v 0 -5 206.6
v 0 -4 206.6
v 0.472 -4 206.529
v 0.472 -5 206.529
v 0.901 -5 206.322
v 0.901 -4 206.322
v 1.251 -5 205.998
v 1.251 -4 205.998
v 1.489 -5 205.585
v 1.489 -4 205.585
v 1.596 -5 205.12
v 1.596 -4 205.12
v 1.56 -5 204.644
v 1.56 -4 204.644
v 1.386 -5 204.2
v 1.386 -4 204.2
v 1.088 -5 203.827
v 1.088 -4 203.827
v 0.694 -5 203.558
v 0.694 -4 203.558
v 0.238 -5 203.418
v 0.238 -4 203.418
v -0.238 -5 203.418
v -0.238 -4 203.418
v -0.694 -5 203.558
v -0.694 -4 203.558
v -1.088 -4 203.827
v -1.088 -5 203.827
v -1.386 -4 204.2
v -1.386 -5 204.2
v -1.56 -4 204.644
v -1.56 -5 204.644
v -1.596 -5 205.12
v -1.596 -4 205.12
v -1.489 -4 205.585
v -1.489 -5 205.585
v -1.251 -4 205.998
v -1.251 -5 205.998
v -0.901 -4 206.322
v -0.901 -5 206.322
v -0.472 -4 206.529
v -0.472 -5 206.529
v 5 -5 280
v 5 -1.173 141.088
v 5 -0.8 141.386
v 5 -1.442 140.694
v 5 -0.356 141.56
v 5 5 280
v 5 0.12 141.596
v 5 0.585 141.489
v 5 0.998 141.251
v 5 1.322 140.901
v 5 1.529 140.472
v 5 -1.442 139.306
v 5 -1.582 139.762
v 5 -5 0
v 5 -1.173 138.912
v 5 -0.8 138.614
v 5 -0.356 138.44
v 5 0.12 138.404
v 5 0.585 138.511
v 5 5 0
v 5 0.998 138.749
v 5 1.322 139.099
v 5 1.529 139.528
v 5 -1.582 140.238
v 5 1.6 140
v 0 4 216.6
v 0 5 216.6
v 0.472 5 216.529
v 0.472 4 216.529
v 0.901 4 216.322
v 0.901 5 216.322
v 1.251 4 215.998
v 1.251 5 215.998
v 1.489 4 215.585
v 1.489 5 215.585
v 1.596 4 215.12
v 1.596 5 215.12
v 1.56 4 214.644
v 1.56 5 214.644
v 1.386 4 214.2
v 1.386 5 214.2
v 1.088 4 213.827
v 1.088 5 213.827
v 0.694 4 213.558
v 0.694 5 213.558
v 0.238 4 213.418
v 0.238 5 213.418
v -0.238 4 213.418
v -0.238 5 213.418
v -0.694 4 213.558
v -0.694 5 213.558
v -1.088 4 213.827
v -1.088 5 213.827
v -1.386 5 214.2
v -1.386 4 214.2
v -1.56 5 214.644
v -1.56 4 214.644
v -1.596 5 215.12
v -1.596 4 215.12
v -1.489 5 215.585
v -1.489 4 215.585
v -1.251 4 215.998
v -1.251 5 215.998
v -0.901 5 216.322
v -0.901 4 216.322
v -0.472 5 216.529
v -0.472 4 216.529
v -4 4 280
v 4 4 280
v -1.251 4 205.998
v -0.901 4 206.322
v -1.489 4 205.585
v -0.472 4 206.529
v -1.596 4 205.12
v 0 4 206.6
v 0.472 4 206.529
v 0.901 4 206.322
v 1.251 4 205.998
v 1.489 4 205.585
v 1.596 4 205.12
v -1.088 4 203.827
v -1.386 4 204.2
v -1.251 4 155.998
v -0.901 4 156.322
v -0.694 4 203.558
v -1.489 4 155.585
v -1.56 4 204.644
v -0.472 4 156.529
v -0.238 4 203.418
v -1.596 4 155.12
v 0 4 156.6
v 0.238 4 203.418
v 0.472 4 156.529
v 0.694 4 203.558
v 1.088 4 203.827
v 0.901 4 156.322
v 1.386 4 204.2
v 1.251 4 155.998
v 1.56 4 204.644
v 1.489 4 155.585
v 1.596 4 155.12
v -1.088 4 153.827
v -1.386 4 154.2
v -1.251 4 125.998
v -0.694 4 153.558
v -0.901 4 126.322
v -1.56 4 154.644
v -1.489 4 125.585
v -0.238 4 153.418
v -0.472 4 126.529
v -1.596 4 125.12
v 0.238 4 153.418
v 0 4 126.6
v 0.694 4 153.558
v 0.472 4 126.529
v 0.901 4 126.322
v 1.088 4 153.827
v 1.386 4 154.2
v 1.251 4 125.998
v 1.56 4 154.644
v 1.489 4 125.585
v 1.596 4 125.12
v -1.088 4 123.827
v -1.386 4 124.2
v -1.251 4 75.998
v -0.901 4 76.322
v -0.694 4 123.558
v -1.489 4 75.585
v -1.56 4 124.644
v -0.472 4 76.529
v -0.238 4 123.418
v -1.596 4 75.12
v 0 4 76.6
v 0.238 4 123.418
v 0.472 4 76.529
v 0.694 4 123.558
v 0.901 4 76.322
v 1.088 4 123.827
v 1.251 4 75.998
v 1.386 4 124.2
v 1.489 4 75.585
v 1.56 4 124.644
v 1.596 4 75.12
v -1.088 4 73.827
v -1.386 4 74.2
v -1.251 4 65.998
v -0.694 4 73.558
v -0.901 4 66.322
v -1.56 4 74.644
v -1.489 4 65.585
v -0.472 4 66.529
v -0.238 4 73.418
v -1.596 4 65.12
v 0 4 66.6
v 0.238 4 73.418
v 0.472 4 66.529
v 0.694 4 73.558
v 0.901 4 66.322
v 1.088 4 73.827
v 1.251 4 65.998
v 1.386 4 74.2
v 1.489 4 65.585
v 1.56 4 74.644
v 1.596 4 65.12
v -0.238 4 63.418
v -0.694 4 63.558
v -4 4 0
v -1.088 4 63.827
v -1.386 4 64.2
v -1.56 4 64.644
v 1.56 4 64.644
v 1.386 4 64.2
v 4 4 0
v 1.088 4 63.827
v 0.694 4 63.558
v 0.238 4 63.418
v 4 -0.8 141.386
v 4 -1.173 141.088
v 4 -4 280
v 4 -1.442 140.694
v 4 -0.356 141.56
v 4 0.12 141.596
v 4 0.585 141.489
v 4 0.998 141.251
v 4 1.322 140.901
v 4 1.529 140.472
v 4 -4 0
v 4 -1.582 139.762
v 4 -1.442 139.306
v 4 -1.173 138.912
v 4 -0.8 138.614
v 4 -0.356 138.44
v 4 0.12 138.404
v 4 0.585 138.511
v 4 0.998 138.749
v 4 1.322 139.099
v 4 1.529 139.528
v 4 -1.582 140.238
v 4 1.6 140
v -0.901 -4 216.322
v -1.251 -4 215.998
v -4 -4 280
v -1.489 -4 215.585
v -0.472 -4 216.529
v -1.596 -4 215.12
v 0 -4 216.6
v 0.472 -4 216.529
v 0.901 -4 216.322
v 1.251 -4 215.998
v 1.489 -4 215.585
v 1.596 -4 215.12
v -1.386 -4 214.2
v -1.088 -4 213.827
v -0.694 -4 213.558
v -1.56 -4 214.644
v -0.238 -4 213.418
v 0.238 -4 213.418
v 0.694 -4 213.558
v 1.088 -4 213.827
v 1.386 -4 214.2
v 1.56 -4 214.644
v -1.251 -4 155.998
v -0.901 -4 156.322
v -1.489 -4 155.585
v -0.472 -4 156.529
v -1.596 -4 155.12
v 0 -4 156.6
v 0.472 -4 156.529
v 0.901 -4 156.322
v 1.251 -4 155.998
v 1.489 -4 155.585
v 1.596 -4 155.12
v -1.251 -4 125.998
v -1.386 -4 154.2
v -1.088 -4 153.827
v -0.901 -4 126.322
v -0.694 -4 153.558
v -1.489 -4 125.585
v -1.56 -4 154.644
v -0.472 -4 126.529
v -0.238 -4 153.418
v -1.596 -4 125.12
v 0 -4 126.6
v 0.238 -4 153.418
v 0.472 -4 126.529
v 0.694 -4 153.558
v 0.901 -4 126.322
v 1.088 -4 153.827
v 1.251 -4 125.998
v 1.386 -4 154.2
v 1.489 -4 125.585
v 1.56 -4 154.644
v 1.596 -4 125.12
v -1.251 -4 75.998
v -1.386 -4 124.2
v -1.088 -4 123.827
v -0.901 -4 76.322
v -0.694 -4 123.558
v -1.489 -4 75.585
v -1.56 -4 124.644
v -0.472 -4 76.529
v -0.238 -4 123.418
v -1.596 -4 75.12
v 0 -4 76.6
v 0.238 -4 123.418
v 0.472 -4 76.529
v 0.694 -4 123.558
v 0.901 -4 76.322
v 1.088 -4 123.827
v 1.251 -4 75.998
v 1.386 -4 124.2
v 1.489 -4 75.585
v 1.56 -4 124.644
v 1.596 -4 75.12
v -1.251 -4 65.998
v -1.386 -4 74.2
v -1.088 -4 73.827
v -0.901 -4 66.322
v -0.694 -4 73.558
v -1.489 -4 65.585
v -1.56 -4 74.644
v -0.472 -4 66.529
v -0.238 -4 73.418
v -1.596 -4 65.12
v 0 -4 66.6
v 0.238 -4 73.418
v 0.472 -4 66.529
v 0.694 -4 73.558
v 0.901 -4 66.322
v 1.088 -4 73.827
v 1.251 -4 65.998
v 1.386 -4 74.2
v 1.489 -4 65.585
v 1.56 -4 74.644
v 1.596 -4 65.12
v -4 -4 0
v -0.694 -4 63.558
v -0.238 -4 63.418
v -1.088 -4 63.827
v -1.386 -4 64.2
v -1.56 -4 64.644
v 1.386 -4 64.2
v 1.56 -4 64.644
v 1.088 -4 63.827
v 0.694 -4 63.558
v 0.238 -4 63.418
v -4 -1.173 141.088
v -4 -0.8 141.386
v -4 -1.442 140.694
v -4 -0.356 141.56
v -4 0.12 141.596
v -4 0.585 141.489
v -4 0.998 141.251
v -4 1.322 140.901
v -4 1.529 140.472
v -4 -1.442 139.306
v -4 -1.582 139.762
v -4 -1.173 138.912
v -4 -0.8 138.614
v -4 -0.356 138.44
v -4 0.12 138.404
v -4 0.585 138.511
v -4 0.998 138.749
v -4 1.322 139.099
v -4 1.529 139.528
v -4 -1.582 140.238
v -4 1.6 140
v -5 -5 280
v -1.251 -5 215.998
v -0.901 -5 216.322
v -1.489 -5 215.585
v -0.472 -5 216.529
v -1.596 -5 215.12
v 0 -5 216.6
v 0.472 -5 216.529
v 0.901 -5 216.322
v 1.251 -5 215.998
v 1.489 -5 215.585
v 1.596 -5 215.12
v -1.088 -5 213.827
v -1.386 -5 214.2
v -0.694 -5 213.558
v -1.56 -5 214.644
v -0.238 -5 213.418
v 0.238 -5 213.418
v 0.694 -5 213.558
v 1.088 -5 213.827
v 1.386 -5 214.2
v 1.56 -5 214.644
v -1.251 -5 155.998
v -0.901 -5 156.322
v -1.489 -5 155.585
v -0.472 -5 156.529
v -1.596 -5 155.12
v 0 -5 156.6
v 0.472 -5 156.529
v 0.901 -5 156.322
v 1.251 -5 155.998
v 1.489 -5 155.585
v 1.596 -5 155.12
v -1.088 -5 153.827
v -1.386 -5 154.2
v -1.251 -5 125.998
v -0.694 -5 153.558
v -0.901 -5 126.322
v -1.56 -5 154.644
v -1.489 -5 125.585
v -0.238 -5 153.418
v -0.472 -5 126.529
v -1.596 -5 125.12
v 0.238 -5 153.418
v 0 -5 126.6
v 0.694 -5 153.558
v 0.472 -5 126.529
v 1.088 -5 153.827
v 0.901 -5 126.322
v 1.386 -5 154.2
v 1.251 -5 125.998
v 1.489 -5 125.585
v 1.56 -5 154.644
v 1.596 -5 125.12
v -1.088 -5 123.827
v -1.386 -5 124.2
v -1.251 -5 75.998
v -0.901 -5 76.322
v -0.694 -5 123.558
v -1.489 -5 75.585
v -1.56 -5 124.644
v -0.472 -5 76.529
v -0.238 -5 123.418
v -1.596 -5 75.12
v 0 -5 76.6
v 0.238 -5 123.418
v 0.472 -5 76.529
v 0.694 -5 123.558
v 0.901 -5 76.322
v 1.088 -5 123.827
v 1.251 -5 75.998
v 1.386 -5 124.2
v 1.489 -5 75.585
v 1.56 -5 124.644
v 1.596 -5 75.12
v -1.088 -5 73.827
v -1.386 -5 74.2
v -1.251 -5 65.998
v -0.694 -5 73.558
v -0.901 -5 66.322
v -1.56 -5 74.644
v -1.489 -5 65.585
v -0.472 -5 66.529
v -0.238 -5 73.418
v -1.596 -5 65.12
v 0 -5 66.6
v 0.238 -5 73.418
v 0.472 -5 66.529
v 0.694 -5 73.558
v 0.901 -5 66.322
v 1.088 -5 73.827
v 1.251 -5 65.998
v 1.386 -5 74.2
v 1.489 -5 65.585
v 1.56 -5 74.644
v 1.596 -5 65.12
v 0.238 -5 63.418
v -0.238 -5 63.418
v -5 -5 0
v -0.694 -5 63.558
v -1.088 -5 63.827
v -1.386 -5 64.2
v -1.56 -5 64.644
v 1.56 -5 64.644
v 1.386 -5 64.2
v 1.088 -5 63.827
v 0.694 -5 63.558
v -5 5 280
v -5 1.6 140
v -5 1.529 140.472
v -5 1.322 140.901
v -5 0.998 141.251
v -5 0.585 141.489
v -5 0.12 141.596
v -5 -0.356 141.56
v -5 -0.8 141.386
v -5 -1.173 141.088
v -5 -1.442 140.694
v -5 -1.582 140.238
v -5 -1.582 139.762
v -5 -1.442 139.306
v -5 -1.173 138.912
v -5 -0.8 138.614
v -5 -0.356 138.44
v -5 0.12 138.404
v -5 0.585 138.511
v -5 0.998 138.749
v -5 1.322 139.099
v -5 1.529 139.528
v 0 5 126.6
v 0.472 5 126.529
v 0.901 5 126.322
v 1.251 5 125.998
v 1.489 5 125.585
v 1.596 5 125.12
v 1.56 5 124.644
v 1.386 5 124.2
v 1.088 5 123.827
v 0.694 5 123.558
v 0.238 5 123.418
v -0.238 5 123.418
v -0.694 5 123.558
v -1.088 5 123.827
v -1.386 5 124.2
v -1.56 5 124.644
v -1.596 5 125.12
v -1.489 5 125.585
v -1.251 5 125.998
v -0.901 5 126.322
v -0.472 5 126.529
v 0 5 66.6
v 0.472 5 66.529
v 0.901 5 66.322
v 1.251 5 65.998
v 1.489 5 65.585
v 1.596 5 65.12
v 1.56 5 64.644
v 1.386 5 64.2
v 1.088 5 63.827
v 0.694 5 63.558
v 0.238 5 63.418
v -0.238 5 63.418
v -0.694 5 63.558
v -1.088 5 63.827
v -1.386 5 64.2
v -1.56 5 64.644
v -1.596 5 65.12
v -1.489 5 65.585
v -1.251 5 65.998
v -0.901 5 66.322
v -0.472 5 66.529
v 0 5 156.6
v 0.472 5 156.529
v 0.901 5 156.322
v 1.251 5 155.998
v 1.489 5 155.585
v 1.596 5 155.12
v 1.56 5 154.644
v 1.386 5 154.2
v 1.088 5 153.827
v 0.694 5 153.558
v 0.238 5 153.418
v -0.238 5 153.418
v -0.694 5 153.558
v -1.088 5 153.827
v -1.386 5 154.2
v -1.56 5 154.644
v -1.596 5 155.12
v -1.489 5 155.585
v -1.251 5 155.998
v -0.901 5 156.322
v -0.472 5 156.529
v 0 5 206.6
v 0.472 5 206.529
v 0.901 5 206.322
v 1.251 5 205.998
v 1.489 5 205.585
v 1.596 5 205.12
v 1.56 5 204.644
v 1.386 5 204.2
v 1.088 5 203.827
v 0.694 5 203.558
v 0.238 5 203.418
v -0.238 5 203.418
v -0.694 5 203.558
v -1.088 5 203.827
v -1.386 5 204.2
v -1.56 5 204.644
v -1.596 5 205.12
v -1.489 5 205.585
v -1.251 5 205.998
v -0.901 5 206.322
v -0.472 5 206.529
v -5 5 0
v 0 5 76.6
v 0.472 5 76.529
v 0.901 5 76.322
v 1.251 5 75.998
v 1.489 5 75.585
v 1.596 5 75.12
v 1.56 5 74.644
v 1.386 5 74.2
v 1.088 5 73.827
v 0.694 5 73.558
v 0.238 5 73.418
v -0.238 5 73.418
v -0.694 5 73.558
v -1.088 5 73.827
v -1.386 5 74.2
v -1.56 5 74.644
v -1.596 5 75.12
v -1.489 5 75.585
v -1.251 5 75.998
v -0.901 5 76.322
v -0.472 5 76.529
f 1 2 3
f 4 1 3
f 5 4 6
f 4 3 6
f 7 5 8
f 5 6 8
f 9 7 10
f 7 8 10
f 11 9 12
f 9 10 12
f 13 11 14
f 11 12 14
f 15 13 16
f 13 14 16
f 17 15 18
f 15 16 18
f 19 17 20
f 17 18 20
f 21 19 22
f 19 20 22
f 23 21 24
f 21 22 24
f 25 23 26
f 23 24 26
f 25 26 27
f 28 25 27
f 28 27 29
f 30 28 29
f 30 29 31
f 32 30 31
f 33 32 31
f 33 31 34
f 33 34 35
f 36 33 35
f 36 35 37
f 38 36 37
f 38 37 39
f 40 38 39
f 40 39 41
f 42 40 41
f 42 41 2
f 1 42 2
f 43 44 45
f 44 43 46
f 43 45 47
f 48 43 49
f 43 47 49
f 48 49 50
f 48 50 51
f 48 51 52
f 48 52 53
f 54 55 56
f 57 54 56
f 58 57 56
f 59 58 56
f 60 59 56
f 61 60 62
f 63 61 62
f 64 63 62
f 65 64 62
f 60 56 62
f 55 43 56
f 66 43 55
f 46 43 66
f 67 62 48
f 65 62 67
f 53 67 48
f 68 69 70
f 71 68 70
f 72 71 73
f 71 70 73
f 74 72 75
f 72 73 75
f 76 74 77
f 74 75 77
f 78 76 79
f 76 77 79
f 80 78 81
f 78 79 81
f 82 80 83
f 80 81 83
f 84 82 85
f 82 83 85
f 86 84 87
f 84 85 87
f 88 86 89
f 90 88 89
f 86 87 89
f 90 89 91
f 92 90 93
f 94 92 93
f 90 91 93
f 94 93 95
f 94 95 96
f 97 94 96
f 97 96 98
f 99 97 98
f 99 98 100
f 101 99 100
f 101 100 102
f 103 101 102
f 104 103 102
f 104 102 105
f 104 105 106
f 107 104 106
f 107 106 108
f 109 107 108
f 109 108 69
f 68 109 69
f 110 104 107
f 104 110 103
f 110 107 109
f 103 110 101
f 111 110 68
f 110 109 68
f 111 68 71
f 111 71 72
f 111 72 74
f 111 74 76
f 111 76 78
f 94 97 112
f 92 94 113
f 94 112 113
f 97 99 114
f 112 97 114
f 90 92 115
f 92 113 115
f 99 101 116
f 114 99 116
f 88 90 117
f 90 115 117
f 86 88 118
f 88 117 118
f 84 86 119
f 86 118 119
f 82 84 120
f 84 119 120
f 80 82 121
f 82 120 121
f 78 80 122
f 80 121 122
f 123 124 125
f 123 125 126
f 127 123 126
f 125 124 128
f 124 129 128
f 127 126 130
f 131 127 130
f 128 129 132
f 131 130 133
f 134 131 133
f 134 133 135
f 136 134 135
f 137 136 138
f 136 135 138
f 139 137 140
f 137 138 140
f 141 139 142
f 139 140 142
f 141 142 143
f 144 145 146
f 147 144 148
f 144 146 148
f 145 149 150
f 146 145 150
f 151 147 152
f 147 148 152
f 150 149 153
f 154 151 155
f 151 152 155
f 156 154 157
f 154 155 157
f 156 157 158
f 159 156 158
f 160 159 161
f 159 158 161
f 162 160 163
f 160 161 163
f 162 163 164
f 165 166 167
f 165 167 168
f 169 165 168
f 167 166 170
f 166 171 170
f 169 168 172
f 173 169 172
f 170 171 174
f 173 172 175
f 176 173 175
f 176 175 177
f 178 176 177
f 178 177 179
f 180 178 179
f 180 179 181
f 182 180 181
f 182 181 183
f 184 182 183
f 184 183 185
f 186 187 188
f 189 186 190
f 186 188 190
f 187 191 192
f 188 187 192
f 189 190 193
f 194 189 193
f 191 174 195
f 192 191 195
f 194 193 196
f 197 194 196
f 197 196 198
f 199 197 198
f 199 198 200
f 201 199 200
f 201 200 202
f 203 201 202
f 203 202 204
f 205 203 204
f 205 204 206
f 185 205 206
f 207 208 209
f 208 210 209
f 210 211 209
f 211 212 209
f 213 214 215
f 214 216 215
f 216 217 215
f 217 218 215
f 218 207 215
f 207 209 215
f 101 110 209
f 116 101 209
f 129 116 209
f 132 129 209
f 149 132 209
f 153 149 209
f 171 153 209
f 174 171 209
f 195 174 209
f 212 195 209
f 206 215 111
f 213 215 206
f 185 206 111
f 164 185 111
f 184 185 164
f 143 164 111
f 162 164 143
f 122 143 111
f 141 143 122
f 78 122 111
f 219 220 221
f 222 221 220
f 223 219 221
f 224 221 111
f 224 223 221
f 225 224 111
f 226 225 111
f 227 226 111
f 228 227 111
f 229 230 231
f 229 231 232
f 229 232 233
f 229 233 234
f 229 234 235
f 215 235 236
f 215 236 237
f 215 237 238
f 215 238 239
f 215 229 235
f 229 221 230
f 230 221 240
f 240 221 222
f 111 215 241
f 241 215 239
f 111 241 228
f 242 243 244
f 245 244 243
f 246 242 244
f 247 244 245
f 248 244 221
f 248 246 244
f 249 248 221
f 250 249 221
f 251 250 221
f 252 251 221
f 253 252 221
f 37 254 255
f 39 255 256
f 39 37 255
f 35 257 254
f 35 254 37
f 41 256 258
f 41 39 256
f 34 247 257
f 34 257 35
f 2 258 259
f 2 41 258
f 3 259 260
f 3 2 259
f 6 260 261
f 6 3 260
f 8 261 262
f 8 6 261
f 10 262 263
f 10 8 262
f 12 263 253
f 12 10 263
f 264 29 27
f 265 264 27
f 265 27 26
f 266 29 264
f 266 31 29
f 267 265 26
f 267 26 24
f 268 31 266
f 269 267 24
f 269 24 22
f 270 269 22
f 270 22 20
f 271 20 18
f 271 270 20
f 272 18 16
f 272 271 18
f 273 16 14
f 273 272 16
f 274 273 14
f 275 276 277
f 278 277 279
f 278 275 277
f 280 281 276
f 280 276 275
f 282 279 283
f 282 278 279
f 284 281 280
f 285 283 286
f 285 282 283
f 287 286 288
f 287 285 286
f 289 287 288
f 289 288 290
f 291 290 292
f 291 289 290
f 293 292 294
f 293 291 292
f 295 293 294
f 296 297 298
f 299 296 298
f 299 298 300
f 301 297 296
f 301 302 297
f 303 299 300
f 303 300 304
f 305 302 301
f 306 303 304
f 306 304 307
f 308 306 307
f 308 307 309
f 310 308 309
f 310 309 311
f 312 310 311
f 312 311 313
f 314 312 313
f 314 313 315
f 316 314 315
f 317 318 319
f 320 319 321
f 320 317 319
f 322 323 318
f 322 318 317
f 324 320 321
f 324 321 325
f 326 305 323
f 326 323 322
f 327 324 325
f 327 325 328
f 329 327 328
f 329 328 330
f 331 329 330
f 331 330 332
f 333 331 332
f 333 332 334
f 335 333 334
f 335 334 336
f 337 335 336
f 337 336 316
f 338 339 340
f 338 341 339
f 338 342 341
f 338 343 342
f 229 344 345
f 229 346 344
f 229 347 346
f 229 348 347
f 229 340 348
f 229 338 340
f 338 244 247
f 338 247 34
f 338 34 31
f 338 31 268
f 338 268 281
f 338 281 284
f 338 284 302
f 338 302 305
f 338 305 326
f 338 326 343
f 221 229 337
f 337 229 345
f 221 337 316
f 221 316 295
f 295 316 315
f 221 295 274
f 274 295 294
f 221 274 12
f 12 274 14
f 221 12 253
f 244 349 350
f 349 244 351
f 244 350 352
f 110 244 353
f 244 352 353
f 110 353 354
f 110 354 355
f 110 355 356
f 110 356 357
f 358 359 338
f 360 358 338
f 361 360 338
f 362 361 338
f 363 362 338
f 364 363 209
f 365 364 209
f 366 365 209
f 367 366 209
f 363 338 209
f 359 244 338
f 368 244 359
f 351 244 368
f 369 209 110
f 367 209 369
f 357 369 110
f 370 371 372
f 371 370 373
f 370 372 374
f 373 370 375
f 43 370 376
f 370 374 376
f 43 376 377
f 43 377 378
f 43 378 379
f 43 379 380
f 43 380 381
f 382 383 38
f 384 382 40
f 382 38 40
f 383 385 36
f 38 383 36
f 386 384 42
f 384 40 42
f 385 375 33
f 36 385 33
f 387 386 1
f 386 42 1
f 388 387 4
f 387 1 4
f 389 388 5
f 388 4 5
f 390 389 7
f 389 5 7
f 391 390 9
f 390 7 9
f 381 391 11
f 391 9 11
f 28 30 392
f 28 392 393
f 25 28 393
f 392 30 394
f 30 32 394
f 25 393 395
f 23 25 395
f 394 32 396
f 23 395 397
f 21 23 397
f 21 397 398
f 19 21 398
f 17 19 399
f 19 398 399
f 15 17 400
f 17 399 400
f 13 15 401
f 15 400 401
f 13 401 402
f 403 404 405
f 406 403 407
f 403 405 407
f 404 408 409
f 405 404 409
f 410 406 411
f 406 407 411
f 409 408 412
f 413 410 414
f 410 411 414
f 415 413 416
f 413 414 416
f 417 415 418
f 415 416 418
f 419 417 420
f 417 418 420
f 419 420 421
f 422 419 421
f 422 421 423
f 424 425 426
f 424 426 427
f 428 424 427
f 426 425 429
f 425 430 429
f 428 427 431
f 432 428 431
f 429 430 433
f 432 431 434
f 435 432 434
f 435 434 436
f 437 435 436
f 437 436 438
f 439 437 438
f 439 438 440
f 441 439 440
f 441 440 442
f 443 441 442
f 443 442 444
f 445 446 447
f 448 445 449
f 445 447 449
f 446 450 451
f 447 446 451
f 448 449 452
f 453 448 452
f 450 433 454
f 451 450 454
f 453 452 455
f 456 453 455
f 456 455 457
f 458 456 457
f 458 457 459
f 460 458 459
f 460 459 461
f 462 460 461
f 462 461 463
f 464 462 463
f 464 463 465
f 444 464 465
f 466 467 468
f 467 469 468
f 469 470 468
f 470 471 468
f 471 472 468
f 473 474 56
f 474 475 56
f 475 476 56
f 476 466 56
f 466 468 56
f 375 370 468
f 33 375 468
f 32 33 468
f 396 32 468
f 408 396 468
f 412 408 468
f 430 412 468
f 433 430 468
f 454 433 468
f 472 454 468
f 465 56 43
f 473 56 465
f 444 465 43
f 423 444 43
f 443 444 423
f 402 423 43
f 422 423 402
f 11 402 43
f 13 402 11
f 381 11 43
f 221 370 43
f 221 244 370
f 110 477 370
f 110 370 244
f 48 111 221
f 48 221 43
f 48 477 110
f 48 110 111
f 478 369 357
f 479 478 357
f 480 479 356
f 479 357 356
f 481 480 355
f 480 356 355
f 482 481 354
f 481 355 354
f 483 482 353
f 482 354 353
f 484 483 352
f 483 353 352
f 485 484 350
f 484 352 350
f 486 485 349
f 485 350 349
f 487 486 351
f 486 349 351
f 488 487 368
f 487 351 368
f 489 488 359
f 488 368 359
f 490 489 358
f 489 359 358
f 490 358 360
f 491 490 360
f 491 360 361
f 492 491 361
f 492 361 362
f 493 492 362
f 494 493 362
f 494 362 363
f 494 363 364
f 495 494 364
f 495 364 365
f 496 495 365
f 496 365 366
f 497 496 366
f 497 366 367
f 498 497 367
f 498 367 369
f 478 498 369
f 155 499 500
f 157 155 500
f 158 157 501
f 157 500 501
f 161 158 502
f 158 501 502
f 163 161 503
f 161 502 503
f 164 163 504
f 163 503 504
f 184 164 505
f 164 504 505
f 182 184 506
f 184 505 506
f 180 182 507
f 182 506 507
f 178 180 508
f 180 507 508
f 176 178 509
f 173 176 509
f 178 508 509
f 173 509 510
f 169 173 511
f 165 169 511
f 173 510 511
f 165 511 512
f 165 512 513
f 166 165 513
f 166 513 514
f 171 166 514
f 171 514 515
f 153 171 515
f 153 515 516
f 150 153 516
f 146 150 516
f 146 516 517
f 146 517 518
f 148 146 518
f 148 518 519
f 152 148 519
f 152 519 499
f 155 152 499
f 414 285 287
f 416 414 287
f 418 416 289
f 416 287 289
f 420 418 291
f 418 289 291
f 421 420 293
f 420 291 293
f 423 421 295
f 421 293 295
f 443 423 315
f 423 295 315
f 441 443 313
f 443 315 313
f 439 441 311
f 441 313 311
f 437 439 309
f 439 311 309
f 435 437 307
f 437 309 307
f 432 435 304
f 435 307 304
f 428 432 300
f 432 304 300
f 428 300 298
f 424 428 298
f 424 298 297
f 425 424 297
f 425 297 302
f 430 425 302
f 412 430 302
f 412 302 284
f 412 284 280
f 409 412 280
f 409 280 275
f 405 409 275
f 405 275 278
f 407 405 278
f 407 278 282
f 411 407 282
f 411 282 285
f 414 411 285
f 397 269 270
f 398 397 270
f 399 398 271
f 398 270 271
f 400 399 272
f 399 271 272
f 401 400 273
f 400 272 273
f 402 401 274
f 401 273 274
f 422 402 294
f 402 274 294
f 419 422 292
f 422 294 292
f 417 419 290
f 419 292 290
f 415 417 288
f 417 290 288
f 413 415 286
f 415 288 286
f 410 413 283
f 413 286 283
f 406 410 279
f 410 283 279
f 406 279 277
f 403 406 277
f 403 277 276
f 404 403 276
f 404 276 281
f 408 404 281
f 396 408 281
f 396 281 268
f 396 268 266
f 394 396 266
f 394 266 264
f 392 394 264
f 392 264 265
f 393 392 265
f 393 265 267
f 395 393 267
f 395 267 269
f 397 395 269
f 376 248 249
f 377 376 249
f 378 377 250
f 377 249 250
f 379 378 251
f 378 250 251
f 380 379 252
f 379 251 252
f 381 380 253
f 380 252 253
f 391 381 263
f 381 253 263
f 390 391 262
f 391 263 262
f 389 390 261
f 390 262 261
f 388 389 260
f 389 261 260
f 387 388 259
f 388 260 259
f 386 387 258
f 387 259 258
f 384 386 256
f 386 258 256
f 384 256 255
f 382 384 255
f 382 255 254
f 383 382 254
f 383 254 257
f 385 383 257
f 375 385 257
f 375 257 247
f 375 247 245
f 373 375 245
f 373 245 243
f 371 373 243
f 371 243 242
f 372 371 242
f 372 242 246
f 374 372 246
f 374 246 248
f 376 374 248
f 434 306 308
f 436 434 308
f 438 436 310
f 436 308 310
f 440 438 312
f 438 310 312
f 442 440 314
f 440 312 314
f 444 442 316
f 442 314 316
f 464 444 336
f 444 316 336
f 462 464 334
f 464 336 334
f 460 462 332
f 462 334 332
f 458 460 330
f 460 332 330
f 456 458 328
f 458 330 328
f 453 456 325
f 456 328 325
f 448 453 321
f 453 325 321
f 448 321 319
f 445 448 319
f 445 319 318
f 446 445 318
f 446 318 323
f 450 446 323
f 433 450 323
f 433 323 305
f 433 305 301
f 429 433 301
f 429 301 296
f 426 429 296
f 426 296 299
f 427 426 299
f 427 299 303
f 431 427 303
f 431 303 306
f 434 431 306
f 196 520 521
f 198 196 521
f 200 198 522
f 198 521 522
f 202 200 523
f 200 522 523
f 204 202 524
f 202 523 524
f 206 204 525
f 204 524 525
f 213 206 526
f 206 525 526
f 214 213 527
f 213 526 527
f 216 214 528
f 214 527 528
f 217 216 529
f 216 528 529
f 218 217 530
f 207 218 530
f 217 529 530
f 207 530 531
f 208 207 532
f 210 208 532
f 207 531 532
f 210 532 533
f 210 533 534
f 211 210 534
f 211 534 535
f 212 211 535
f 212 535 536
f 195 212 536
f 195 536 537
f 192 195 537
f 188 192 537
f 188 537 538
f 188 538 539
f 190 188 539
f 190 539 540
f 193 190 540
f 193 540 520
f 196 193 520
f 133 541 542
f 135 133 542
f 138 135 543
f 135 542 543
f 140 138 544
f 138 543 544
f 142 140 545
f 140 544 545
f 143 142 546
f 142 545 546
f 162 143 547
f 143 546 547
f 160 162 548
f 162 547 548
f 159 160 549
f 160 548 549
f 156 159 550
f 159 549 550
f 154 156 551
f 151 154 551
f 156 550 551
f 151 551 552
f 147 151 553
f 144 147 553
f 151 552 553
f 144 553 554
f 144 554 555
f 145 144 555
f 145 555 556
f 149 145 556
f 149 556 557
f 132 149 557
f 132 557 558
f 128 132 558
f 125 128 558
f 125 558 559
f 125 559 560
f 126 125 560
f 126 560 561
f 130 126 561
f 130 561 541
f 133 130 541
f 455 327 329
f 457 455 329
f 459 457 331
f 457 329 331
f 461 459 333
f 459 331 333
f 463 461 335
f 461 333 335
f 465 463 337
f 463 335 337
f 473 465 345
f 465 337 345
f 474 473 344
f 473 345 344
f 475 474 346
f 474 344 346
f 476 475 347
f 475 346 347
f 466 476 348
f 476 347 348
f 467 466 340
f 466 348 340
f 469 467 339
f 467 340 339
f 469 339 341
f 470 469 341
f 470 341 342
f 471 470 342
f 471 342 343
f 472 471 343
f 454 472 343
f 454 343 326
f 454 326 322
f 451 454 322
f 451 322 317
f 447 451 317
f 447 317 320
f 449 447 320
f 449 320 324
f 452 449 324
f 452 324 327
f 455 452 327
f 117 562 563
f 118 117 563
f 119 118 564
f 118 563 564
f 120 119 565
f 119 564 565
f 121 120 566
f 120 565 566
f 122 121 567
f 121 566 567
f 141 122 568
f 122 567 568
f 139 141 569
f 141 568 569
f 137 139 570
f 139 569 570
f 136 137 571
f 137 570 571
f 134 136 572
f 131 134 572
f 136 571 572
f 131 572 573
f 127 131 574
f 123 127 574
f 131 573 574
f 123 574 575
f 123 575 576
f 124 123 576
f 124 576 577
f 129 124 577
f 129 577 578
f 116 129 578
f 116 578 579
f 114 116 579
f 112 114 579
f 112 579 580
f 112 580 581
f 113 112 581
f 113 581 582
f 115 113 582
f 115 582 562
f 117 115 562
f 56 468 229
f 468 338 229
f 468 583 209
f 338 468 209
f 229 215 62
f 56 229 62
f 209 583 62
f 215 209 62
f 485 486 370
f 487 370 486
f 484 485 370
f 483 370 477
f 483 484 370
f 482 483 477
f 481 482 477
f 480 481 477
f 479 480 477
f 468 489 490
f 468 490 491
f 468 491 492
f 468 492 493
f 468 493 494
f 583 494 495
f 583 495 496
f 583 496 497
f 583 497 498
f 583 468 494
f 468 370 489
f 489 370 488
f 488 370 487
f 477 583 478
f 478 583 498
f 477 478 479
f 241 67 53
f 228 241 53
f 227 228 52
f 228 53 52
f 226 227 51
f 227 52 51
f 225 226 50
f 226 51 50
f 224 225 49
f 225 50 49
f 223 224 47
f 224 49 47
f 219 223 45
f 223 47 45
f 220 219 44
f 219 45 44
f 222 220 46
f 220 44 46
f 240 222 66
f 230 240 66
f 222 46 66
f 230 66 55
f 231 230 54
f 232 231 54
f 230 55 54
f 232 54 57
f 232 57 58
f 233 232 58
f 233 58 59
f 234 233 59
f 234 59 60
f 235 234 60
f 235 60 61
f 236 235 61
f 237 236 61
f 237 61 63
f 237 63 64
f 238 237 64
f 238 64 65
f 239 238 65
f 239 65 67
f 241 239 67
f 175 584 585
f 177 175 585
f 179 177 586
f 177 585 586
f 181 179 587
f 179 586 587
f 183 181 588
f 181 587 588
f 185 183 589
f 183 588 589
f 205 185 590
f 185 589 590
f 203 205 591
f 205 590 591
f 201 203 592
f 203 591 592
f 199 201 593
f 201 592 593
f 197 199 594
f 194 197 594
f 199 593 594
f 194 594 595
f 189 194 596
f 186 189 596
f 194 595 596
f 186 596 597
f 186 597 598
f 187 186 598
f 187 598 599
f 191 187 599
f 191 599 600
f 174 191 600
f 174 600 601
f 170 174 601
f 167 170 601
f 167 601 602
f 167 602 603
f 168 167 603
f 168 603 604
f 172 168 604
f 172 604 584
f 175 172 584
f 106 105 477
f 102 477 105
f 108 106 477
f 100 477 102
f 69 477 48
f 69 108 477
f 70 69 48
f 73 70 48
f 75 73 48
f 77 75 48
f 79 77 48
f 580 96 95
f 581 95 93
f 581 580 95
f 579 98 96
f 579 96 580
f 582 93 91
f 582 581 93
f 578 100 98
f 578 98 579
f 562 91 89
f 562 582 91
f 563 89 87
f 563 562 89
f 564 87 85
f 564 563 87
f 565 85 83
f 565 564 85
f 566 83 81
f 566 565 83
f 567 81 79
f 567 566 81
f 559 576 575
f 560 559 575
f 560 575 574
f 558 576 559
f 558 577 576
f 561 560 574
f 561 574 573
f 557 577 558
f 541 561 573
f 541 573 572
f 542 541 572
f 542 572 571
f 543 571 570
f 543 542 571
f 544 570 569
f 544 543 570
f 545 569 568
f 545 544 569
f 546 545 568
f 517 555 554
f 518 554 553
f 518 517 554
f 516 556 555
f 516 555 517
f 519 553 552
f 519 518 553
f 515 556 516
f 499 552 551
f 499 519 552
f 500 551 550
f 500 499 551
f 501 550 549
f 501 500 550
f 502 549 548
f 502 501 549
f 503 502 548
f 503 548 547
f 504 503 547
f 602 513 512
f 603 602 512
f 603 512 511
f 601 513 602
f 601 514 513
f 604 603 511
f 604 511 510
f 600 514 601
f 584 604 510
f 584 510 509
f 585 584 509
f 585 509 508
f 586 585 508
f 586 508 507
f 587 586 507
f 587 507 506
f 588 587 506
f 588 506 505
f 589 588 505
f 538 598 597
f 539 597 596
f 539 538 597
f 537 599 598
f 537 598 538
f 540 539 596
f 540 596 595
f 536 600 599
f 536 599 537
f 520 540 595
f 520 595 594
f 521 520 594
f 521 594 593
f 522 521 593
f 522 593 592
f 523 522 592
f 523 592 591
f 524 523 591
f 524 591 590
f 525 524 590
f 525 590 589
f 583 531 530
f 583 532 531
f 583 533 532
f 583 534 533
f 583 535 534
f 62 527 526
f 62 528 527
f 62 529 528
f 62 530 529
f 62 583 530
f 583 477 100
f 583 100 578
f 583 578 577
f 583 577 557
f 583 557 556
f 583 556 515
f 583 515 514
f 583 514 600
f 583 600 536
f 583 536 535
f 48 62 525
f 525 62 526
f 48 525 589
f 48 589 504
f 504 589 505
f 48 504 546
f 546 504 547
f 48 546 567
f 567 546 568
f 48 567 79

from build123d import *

# Parameters (mm, degrees)
SKETCH1_W           = 10
SKETCH1_H           = 10
SKETCH1_W_2         = 8
SKETCH1_H_2         = 8
BOSS_EXTRUDE1_DEPTH = 280
CUT_EXTRUDE1_REACH  = 282.223
SKETCH2_R           = 1.6
CUT_EXTRUDE2_REACH  = 282.223
SKETCH3_R           = 1.6


with BuildPart() as part:
    # Sketch1 → Boss-Extrude1 (new body)
    with BuildSketch(Plane.XY):
        Rectangle(SKETCH1_W, SKETCH1_H)
        Rectangle(SKETCH1_W_2, SKETCH1_H_2, mode=Mode.SUBTRACT)
    extrude(amount=BOSS_EXTRUDE1_DEPTH)

    # Cut-Extrude1: up to this face of the body (flat: up to its plane)
    cut_extrude1_end = Plane(part.part.faces().sort_by_distance((-5, 0, 140))[0])
    # Sketch2 → Cut-Extrude1 (cut, up to the picked face)
    with BuildSketch(Plane(origin=(5, 0, 0), x_dir=(0, 0, -1), z_dir=(1, 0, 0)), mode=Mode.PRIVATE) as cut_extrude1_sk1:
        with Locations(Location((-140, 0, 0), (0, 0, 90))):
            Circle(SKETCH2_R)
    cut_extrude1_tool1 = split(extrude(cut_extrude1_sk1.sketch, amount=-CUT_EXTRUDE1_REACH, mode=Mode.PRIVATE), bisect_by=cut_extrude1_end, keep=Keep.BOTH, mode=Mode.PRIVATE)
    add(cut_extrude1_tool1.solids().sort_by(Axis((5, 0, 140), (-1, 0, 0)))[0], mode=Mode.SUBTRACT)

    # Cut-Extrude2: up to this face of the body (flat: up to its plane)
    cut_extrude2_end = Plane(part.part.faces().sort_by_distance((0, -5, 140))[0])
    # Sketch3 → Cut-Extrude2 (cut, up to the picked face)
    with BuildSketch(Plane(origin=(0, 5, 0), x_dir=(1, 0, 0), z_dir=(0, 1, 0)), mode=Mode.PRIVATE) as cut_extrude2_sk1:
        with Locations(Location((0, -65, 0), (0, 0, 270))):
            Circle(SKETCH3_R)
    cut_extrude2_tool1 = split(extrude(cut_extrude2_sk1.sketch, amount=-CUT_EXTRUDE2_REACH, mode=Mode.PRIVATE), bisect_by=cut_extrude2_end, keep=Keep.BOTH, mode=Mode.PRIVATE)
    # Sketch3 → Cut-Extrude2 (cut, up to the picked face)
    with BuildSketch(Plane(origin=(0, 5, 0), x_dir=(1, 0, 0), z_dir=(0, 1, 0)), mode=Mode.PRIVATE) as cut_extrude2_sk2:
        with Locations(Location((0, -75, 0), (0, 0, 270))):
            Circle(SKETCH3_R)
    cut_extrude2_tool2 = split(extrude(cut_extrude2_sk2.sketch, amount=-CUT_EXTRUDE2_REACH, mode=Mode.PRIVATE), bisect_by=cut_extrude2_end, keep=Keep.BOTH, mode=Mode.PRIVATE)
    # Sketch3 → Cut-Extrude2 (cut, up to the picked face)
    with BuildSketch(Plane(origin=(0, 5, 0), x_dir=(1, 0, 0), z_dir=(0, 1, 0)), mode=Mode.PRIVATE) as cut_extrude2_sk3:
        with Locations(Location((0, -205, 0), (0, 0, 270))):
            Circle(SKETCH3_R)
    cut_extrude2_tool3 = split(extrude(cut_extrude2_sk3.sketch, amount=-CUT_EXTRUDE2_REACH, mode=Mode.PRIVATE), bisect_by=cut_extrude2_end, keep=Keep.BOTH, mode=Mode.PRIVATE)
    # Sketch3 → Cut-Extrude2 (cut, up to the picked face)
    with BuildSketch(Plane(origin=(0, 5, 0), x_dir=(1, 0, 0), z_dir=(0, 1, 0)), mode=Mode.PRIVATE) as cut_extrude2_sk4:
        with Locations(Location((0, -215, 0), (0, 0, 270))):
            Circle(SKETCH3_R)
    cut_extrude2_tool4 = split(extrude(cut_extrude2_sk4.sketch, amount=-CUT_EXTRUDE2_REACH, mode=Mode.PRIVATE), bisect_by=cut_extrude2_end, keep=Keep.BOTH, mode=Mode.PRIVATE)
    # Sketch3 → Cut-Extrude2 (cut, up to the picked face)
    with BuildSketch(Plane(origin=(0, 5, 0), x_dir=(1, 0, 0), z_dir=(0, 1, 0)), mode=Mode.PRIVATE) as cut_extrude2_sk5:
        with Locations(Location((0, -125, 0), (0, 0, 270))):
            Circle(SKETCH3_R)
    cut_extrude2_tool5 = split(extrude(cut_extrude2_sk5.sketch, amount=-CUT_EXTRUDE2_REACH, mode=Mode.PRIVATE), bisect_by=cut_extrude2_end, keep=Keep.BOTH, mode=Mode.PRIVATE)
    # Sketch3 → Cut-Extrude2 (cut, up to the picked face)
    with BuildSketch(Plane(origin=(0, 5, 0), x_dir=(1, 0, 0), z_dir=(0, 1, 0)), mode=Mode.PRIVATE) as cut_extrude2_sk6:
        with Locations(Location((0, -155, 0), (0, 0, 270))):
            Circle(SKETCH3_R)
    cut_extrude2_tool6 = split(extrude(cut_extrude2_sk6.sketch, amount=-CUT_EXTRUDE2_REACH, mode=Mode.PRIVATE), bisect_by=cut_extrude2_end, keep=Keep.BOTH, mode=Mode.PRIVATE)
    add(cut_extrude2_tool1.solids().sort_by(Axis((0, 5, 65), (0, -1, 0)))[0], mode=Mode.SUBTRACT)
    add(cut_extrude2_tool2.solids().sort_by(Axis((0, 5, 75), (0, -1, 0)))[0], mode=Mode.SUBTRACT)
    add(cut_extrude2_tool3.solids().sort_by(Axis((0, 5, 205), (0, -1, 0)))[0], mode=Mode.SUBTRACT)
    add(cut_extrude2_tool4.solids().sort_by(Axis((0, 5, 215), (0, -1, 0)))[0], mode=Mode.SUBTRACT)
    add(cut_extrude2_tool5.solids().sort_by(Axis((0, 5, 125), (0, -1, 0)))[0], mode=Mode.SUBTRACT)
    add(cut_extrude2_tool6.solids().sort_by(Axis((0, 5, 155), (0, -1, 0)))[0], mode=Mode.SUBTRACT)


solid = part.part
